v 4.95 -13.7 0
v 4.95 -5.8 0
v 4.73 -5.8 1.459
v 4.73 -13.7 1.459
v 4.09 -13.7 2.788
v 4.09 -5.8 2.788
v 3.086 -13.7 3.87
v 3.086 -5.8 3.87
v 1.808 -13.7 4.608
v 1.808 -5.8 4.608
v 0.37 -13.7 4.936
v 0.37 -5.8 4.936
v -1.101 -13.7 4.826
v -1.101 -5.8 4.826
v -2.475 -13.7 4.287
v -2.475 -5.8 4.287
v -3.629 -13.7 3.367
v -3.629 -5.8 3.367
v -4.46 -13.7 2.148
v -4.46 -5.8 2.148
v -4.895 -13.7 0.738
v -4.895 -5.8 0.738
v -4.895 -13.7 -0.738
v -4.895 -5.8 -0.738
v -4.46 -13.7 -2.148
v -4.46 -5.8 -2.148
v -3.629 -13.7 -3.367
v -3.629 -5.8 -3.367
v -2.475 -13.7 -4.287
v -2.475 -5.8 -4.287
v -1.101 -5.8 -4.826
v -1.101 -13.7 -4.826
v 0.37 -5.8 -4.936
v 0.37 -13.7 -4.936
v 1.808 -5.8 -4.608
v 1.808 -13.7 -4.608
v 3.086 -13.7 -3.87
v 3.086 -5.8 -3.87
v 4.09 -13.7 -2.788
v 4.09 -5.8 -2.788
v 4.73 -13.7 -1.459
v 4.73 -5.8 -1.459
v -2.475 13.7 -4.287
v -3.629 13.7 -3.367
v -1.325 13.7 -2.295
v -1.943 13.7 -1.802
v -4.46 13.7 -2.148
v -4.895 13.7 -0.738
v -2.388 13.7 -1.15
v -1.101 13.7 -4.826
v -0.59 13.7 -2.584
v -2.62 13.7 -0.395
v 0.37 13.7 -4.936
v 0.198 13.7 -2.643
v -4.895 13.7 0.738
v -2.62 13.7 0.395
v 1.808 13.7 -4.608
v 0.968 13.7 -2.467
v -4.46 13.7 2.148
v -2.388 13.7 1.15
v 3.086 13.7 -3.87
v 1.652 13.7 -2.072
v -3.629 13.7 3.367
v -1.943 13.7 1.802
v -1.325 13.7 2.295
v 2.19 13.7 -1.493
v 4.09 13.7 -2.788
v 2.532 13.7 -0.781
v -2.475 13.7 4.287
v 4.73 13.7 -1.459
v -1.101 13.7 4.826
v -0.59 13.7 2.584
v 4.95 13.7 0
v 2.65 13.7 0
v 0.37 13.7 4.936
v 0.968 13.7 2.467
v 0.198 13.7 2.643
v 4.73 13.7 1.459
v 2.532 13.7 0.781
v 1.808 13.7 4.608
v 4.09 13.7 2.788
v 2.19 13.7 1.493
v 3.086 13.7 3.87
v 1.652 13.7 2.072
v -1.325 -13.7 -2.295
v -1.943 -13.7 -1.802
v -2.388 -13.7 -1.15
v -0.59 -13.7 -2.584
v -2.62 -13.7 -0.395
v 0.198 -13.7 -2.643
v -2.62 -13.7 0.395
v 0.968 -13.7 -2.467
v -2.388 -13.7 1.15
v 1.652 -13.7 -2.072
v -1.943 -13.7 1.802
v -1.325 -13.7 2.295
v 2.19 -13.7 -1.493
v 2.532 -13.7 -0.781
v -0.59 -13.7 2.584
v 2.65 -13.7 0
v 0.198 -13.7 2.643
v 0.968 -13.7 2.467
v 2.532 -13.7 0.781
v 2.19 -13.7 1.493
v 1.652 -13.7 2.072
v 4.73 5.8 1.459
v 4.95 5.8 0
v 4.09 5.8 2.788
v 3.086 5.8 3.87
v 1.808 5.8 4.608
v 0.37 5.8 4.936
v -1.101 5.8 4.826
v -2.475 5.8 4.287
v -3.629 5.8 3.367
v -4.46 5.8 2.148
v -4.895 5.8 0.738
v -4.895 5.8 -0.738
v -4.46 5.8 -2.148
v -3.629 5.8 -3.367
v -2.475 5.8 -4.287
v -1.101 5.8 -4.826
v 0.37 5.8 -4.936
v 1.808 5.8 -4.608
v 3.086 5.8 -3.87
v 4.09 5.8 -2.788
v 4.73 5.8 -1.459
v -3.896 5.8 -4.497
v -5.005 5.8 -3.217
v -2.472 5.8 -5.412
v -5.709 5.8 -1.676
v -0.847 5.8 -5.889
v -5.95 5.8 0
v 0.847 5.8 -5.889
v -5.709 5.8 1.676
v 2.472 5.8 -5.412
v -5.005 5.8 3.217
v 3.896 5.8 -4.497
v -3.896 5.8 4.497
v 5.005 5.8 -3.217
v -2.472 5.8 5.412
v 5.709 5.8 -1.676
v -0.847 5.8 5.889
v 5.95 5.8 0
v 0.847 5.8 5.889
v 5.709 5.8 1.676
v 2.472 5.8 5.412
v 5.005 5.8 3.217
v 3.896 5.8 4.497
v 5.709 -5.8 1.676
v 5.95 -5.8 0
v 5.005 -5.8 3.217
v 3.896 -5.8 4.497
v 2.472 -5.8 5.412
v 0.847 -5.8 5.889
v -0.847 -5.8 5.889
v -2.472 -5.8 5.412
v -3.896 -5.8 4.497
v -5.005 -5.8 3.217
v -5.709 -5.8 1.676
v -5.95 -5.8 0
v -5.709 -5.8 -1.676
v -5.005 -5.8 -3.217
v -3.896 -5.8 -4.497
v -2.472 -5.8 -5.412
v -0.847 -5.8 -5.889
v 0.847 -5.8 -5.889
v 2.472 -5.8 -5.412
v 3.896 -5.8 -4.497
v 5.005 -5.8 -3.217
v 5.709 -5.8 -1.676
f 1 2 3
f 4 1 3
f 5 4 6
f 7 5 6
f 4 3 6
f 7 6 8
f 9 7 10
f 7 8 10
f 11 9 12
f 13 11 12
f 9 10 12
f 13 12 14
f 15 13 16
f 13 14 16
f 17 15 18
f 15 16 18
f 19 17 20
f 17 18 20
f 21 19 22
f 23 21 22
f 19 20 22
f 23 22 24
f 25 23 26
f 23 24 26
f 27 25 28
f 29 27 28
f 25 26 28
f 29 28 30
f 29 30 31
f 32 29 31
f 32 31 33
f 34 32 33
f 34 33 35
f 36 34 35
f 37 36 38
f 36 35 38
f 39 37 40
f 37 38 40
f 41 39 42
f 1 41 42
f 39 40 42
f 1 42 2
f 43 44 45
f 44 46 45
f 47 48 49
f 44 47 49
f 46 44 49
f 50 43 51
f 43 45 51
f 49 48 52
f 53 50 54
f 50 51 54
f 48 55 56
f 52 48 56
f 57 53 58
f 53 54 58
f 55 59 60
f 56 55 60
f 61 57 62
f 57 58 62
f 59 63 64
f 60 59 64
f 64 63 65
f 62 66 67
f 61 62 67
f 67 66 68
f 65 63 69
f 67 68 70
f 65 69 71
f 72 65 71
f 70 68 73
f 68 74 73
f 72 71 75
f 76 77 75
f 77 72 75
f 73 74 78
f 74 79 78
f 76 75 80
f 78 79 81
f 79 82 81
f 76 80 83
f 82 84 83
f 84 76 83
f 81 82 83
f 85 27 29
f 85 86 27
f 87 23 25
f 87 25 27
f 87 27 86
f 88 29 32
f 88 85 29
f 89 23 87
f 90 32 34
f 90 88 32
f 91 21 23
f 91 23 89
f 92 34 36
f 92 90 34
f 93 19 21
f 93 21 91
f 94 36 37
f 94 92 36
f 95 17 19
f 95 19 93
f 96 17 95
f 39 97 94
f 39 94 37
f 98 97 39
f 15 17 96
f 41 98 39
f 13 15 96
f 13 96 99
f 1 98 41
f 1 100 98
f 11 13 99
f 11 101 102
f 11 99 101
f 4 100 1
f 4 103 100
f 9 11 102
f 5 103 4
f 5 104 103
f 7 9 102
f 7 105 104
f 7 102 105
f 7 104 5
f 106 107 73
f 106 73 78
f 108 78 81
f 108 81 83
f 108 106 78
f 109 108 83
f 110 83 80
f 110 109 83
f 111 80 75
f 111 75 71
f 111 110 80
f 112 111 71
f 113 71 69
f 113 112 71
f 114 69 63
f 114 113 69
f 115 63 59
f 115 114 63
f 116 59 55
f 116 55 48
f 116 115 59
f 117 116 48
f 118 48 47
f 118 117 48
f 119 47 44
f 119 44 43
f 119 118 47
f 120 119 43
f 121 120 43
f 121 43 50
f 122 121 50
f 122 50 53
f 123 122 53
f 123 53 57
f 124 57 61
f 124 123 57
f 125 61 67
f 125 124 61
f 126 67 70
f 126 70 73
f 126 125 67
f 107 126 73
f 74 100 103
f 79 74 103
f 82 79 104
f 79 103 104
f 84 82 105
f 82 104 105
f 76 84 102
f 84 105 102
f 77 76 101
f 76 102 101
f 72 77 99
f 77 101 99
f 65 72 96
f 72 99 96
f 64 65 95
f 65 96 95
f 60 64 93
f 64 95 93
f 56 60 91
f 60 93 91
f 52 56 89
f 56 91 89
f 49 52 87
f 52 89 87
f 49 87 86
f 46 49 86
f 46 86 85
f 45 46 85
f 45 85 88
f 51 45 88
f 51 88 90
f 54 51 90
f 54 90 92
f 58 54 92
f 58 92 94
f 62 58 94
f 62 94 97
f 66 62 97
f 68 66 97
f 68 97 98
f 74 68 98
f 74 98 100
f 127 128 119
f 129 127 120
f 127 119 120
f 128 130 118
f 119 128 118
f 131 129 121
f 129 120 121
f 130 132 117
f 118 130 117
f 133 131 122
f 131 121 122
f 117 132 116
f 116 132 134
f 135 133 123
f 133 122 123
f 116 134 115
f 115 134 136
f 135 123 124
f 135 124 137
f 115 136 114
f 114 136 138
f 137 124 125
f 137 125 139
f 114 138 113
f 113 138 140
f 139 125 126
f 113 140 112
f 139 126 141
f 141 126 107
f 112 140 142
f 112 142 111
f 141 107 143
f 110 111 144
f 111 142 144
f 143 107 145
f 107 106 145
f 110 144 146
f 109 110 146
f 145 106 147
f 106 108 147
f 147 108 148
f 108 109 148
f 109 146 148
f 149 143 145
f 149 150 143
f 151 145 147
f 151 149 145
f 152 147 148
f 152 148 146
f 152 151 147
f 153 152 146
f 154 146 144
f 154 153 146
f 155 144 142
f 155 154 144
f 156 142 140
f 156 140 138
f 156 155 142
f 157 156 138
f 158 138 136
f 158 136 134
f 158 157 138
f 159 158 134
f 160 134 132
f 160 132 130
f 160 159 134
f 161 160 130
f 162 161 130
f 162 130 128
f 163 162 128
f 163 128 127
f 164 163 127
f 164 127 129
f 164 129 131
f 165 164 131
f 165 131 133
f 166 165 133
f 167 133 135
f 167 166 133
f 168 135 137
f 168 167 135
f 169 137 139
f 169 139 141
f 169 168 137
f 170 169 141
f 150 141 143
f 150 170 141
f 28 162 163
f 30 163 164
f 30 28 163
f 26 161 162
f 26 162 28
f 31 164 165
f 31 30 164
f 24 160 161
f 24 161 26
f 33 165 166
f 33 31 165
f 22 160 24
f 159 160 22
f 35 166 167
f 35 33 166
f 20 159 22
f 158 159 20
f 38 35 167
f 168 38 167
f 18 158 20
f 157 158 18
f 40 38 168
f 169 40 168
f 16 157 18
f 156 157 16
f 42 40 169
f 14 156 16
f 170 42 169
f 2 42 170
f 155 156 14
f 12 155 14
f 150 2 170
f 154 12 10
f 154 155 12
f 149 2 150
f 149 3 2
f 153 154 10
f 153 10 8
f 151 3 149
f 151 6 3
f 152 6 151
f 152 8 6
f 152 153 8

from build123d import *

# Parameters (mm, degrees)
F0_R     = 5.95
F1_DEPTH = 5.8
F2_R     = 4.95
F3_DEPTH = 7.9
F5_R     = 2.65
F6_DEPTH = 35


with BuildPart() as f1:
    # F0 (on Front) → F1 (new body)
    with BuildSketch(Plane.XZ):
        Circle(F0_R)
    extrude(amount=F1_DEPTH)

    # F2 (on face) → F3 (join)
    with BuildSketch(Plane.XZ.offset(5.8)):
        Circle(F2_R)
    extrude(amount=F3_DEPTH)

    # F4: F1 across face


with BuildPart() as f1_1:
    add(f1.part)
    add(f1.part.mirror(Plane(origin=(0, 0, 0), x_dir=(1, 0, 0), z_dir=(0, 1, 0))))

    # F5 (on face) → F6 (cut)
    with BuildSketch(Plane.XZ.offset(13.7)):
        Circle(F5_R)
    extrude(amount=-F6_DEPTH, mode=Mode.SUBTRACT)


solid = f1_1.part
